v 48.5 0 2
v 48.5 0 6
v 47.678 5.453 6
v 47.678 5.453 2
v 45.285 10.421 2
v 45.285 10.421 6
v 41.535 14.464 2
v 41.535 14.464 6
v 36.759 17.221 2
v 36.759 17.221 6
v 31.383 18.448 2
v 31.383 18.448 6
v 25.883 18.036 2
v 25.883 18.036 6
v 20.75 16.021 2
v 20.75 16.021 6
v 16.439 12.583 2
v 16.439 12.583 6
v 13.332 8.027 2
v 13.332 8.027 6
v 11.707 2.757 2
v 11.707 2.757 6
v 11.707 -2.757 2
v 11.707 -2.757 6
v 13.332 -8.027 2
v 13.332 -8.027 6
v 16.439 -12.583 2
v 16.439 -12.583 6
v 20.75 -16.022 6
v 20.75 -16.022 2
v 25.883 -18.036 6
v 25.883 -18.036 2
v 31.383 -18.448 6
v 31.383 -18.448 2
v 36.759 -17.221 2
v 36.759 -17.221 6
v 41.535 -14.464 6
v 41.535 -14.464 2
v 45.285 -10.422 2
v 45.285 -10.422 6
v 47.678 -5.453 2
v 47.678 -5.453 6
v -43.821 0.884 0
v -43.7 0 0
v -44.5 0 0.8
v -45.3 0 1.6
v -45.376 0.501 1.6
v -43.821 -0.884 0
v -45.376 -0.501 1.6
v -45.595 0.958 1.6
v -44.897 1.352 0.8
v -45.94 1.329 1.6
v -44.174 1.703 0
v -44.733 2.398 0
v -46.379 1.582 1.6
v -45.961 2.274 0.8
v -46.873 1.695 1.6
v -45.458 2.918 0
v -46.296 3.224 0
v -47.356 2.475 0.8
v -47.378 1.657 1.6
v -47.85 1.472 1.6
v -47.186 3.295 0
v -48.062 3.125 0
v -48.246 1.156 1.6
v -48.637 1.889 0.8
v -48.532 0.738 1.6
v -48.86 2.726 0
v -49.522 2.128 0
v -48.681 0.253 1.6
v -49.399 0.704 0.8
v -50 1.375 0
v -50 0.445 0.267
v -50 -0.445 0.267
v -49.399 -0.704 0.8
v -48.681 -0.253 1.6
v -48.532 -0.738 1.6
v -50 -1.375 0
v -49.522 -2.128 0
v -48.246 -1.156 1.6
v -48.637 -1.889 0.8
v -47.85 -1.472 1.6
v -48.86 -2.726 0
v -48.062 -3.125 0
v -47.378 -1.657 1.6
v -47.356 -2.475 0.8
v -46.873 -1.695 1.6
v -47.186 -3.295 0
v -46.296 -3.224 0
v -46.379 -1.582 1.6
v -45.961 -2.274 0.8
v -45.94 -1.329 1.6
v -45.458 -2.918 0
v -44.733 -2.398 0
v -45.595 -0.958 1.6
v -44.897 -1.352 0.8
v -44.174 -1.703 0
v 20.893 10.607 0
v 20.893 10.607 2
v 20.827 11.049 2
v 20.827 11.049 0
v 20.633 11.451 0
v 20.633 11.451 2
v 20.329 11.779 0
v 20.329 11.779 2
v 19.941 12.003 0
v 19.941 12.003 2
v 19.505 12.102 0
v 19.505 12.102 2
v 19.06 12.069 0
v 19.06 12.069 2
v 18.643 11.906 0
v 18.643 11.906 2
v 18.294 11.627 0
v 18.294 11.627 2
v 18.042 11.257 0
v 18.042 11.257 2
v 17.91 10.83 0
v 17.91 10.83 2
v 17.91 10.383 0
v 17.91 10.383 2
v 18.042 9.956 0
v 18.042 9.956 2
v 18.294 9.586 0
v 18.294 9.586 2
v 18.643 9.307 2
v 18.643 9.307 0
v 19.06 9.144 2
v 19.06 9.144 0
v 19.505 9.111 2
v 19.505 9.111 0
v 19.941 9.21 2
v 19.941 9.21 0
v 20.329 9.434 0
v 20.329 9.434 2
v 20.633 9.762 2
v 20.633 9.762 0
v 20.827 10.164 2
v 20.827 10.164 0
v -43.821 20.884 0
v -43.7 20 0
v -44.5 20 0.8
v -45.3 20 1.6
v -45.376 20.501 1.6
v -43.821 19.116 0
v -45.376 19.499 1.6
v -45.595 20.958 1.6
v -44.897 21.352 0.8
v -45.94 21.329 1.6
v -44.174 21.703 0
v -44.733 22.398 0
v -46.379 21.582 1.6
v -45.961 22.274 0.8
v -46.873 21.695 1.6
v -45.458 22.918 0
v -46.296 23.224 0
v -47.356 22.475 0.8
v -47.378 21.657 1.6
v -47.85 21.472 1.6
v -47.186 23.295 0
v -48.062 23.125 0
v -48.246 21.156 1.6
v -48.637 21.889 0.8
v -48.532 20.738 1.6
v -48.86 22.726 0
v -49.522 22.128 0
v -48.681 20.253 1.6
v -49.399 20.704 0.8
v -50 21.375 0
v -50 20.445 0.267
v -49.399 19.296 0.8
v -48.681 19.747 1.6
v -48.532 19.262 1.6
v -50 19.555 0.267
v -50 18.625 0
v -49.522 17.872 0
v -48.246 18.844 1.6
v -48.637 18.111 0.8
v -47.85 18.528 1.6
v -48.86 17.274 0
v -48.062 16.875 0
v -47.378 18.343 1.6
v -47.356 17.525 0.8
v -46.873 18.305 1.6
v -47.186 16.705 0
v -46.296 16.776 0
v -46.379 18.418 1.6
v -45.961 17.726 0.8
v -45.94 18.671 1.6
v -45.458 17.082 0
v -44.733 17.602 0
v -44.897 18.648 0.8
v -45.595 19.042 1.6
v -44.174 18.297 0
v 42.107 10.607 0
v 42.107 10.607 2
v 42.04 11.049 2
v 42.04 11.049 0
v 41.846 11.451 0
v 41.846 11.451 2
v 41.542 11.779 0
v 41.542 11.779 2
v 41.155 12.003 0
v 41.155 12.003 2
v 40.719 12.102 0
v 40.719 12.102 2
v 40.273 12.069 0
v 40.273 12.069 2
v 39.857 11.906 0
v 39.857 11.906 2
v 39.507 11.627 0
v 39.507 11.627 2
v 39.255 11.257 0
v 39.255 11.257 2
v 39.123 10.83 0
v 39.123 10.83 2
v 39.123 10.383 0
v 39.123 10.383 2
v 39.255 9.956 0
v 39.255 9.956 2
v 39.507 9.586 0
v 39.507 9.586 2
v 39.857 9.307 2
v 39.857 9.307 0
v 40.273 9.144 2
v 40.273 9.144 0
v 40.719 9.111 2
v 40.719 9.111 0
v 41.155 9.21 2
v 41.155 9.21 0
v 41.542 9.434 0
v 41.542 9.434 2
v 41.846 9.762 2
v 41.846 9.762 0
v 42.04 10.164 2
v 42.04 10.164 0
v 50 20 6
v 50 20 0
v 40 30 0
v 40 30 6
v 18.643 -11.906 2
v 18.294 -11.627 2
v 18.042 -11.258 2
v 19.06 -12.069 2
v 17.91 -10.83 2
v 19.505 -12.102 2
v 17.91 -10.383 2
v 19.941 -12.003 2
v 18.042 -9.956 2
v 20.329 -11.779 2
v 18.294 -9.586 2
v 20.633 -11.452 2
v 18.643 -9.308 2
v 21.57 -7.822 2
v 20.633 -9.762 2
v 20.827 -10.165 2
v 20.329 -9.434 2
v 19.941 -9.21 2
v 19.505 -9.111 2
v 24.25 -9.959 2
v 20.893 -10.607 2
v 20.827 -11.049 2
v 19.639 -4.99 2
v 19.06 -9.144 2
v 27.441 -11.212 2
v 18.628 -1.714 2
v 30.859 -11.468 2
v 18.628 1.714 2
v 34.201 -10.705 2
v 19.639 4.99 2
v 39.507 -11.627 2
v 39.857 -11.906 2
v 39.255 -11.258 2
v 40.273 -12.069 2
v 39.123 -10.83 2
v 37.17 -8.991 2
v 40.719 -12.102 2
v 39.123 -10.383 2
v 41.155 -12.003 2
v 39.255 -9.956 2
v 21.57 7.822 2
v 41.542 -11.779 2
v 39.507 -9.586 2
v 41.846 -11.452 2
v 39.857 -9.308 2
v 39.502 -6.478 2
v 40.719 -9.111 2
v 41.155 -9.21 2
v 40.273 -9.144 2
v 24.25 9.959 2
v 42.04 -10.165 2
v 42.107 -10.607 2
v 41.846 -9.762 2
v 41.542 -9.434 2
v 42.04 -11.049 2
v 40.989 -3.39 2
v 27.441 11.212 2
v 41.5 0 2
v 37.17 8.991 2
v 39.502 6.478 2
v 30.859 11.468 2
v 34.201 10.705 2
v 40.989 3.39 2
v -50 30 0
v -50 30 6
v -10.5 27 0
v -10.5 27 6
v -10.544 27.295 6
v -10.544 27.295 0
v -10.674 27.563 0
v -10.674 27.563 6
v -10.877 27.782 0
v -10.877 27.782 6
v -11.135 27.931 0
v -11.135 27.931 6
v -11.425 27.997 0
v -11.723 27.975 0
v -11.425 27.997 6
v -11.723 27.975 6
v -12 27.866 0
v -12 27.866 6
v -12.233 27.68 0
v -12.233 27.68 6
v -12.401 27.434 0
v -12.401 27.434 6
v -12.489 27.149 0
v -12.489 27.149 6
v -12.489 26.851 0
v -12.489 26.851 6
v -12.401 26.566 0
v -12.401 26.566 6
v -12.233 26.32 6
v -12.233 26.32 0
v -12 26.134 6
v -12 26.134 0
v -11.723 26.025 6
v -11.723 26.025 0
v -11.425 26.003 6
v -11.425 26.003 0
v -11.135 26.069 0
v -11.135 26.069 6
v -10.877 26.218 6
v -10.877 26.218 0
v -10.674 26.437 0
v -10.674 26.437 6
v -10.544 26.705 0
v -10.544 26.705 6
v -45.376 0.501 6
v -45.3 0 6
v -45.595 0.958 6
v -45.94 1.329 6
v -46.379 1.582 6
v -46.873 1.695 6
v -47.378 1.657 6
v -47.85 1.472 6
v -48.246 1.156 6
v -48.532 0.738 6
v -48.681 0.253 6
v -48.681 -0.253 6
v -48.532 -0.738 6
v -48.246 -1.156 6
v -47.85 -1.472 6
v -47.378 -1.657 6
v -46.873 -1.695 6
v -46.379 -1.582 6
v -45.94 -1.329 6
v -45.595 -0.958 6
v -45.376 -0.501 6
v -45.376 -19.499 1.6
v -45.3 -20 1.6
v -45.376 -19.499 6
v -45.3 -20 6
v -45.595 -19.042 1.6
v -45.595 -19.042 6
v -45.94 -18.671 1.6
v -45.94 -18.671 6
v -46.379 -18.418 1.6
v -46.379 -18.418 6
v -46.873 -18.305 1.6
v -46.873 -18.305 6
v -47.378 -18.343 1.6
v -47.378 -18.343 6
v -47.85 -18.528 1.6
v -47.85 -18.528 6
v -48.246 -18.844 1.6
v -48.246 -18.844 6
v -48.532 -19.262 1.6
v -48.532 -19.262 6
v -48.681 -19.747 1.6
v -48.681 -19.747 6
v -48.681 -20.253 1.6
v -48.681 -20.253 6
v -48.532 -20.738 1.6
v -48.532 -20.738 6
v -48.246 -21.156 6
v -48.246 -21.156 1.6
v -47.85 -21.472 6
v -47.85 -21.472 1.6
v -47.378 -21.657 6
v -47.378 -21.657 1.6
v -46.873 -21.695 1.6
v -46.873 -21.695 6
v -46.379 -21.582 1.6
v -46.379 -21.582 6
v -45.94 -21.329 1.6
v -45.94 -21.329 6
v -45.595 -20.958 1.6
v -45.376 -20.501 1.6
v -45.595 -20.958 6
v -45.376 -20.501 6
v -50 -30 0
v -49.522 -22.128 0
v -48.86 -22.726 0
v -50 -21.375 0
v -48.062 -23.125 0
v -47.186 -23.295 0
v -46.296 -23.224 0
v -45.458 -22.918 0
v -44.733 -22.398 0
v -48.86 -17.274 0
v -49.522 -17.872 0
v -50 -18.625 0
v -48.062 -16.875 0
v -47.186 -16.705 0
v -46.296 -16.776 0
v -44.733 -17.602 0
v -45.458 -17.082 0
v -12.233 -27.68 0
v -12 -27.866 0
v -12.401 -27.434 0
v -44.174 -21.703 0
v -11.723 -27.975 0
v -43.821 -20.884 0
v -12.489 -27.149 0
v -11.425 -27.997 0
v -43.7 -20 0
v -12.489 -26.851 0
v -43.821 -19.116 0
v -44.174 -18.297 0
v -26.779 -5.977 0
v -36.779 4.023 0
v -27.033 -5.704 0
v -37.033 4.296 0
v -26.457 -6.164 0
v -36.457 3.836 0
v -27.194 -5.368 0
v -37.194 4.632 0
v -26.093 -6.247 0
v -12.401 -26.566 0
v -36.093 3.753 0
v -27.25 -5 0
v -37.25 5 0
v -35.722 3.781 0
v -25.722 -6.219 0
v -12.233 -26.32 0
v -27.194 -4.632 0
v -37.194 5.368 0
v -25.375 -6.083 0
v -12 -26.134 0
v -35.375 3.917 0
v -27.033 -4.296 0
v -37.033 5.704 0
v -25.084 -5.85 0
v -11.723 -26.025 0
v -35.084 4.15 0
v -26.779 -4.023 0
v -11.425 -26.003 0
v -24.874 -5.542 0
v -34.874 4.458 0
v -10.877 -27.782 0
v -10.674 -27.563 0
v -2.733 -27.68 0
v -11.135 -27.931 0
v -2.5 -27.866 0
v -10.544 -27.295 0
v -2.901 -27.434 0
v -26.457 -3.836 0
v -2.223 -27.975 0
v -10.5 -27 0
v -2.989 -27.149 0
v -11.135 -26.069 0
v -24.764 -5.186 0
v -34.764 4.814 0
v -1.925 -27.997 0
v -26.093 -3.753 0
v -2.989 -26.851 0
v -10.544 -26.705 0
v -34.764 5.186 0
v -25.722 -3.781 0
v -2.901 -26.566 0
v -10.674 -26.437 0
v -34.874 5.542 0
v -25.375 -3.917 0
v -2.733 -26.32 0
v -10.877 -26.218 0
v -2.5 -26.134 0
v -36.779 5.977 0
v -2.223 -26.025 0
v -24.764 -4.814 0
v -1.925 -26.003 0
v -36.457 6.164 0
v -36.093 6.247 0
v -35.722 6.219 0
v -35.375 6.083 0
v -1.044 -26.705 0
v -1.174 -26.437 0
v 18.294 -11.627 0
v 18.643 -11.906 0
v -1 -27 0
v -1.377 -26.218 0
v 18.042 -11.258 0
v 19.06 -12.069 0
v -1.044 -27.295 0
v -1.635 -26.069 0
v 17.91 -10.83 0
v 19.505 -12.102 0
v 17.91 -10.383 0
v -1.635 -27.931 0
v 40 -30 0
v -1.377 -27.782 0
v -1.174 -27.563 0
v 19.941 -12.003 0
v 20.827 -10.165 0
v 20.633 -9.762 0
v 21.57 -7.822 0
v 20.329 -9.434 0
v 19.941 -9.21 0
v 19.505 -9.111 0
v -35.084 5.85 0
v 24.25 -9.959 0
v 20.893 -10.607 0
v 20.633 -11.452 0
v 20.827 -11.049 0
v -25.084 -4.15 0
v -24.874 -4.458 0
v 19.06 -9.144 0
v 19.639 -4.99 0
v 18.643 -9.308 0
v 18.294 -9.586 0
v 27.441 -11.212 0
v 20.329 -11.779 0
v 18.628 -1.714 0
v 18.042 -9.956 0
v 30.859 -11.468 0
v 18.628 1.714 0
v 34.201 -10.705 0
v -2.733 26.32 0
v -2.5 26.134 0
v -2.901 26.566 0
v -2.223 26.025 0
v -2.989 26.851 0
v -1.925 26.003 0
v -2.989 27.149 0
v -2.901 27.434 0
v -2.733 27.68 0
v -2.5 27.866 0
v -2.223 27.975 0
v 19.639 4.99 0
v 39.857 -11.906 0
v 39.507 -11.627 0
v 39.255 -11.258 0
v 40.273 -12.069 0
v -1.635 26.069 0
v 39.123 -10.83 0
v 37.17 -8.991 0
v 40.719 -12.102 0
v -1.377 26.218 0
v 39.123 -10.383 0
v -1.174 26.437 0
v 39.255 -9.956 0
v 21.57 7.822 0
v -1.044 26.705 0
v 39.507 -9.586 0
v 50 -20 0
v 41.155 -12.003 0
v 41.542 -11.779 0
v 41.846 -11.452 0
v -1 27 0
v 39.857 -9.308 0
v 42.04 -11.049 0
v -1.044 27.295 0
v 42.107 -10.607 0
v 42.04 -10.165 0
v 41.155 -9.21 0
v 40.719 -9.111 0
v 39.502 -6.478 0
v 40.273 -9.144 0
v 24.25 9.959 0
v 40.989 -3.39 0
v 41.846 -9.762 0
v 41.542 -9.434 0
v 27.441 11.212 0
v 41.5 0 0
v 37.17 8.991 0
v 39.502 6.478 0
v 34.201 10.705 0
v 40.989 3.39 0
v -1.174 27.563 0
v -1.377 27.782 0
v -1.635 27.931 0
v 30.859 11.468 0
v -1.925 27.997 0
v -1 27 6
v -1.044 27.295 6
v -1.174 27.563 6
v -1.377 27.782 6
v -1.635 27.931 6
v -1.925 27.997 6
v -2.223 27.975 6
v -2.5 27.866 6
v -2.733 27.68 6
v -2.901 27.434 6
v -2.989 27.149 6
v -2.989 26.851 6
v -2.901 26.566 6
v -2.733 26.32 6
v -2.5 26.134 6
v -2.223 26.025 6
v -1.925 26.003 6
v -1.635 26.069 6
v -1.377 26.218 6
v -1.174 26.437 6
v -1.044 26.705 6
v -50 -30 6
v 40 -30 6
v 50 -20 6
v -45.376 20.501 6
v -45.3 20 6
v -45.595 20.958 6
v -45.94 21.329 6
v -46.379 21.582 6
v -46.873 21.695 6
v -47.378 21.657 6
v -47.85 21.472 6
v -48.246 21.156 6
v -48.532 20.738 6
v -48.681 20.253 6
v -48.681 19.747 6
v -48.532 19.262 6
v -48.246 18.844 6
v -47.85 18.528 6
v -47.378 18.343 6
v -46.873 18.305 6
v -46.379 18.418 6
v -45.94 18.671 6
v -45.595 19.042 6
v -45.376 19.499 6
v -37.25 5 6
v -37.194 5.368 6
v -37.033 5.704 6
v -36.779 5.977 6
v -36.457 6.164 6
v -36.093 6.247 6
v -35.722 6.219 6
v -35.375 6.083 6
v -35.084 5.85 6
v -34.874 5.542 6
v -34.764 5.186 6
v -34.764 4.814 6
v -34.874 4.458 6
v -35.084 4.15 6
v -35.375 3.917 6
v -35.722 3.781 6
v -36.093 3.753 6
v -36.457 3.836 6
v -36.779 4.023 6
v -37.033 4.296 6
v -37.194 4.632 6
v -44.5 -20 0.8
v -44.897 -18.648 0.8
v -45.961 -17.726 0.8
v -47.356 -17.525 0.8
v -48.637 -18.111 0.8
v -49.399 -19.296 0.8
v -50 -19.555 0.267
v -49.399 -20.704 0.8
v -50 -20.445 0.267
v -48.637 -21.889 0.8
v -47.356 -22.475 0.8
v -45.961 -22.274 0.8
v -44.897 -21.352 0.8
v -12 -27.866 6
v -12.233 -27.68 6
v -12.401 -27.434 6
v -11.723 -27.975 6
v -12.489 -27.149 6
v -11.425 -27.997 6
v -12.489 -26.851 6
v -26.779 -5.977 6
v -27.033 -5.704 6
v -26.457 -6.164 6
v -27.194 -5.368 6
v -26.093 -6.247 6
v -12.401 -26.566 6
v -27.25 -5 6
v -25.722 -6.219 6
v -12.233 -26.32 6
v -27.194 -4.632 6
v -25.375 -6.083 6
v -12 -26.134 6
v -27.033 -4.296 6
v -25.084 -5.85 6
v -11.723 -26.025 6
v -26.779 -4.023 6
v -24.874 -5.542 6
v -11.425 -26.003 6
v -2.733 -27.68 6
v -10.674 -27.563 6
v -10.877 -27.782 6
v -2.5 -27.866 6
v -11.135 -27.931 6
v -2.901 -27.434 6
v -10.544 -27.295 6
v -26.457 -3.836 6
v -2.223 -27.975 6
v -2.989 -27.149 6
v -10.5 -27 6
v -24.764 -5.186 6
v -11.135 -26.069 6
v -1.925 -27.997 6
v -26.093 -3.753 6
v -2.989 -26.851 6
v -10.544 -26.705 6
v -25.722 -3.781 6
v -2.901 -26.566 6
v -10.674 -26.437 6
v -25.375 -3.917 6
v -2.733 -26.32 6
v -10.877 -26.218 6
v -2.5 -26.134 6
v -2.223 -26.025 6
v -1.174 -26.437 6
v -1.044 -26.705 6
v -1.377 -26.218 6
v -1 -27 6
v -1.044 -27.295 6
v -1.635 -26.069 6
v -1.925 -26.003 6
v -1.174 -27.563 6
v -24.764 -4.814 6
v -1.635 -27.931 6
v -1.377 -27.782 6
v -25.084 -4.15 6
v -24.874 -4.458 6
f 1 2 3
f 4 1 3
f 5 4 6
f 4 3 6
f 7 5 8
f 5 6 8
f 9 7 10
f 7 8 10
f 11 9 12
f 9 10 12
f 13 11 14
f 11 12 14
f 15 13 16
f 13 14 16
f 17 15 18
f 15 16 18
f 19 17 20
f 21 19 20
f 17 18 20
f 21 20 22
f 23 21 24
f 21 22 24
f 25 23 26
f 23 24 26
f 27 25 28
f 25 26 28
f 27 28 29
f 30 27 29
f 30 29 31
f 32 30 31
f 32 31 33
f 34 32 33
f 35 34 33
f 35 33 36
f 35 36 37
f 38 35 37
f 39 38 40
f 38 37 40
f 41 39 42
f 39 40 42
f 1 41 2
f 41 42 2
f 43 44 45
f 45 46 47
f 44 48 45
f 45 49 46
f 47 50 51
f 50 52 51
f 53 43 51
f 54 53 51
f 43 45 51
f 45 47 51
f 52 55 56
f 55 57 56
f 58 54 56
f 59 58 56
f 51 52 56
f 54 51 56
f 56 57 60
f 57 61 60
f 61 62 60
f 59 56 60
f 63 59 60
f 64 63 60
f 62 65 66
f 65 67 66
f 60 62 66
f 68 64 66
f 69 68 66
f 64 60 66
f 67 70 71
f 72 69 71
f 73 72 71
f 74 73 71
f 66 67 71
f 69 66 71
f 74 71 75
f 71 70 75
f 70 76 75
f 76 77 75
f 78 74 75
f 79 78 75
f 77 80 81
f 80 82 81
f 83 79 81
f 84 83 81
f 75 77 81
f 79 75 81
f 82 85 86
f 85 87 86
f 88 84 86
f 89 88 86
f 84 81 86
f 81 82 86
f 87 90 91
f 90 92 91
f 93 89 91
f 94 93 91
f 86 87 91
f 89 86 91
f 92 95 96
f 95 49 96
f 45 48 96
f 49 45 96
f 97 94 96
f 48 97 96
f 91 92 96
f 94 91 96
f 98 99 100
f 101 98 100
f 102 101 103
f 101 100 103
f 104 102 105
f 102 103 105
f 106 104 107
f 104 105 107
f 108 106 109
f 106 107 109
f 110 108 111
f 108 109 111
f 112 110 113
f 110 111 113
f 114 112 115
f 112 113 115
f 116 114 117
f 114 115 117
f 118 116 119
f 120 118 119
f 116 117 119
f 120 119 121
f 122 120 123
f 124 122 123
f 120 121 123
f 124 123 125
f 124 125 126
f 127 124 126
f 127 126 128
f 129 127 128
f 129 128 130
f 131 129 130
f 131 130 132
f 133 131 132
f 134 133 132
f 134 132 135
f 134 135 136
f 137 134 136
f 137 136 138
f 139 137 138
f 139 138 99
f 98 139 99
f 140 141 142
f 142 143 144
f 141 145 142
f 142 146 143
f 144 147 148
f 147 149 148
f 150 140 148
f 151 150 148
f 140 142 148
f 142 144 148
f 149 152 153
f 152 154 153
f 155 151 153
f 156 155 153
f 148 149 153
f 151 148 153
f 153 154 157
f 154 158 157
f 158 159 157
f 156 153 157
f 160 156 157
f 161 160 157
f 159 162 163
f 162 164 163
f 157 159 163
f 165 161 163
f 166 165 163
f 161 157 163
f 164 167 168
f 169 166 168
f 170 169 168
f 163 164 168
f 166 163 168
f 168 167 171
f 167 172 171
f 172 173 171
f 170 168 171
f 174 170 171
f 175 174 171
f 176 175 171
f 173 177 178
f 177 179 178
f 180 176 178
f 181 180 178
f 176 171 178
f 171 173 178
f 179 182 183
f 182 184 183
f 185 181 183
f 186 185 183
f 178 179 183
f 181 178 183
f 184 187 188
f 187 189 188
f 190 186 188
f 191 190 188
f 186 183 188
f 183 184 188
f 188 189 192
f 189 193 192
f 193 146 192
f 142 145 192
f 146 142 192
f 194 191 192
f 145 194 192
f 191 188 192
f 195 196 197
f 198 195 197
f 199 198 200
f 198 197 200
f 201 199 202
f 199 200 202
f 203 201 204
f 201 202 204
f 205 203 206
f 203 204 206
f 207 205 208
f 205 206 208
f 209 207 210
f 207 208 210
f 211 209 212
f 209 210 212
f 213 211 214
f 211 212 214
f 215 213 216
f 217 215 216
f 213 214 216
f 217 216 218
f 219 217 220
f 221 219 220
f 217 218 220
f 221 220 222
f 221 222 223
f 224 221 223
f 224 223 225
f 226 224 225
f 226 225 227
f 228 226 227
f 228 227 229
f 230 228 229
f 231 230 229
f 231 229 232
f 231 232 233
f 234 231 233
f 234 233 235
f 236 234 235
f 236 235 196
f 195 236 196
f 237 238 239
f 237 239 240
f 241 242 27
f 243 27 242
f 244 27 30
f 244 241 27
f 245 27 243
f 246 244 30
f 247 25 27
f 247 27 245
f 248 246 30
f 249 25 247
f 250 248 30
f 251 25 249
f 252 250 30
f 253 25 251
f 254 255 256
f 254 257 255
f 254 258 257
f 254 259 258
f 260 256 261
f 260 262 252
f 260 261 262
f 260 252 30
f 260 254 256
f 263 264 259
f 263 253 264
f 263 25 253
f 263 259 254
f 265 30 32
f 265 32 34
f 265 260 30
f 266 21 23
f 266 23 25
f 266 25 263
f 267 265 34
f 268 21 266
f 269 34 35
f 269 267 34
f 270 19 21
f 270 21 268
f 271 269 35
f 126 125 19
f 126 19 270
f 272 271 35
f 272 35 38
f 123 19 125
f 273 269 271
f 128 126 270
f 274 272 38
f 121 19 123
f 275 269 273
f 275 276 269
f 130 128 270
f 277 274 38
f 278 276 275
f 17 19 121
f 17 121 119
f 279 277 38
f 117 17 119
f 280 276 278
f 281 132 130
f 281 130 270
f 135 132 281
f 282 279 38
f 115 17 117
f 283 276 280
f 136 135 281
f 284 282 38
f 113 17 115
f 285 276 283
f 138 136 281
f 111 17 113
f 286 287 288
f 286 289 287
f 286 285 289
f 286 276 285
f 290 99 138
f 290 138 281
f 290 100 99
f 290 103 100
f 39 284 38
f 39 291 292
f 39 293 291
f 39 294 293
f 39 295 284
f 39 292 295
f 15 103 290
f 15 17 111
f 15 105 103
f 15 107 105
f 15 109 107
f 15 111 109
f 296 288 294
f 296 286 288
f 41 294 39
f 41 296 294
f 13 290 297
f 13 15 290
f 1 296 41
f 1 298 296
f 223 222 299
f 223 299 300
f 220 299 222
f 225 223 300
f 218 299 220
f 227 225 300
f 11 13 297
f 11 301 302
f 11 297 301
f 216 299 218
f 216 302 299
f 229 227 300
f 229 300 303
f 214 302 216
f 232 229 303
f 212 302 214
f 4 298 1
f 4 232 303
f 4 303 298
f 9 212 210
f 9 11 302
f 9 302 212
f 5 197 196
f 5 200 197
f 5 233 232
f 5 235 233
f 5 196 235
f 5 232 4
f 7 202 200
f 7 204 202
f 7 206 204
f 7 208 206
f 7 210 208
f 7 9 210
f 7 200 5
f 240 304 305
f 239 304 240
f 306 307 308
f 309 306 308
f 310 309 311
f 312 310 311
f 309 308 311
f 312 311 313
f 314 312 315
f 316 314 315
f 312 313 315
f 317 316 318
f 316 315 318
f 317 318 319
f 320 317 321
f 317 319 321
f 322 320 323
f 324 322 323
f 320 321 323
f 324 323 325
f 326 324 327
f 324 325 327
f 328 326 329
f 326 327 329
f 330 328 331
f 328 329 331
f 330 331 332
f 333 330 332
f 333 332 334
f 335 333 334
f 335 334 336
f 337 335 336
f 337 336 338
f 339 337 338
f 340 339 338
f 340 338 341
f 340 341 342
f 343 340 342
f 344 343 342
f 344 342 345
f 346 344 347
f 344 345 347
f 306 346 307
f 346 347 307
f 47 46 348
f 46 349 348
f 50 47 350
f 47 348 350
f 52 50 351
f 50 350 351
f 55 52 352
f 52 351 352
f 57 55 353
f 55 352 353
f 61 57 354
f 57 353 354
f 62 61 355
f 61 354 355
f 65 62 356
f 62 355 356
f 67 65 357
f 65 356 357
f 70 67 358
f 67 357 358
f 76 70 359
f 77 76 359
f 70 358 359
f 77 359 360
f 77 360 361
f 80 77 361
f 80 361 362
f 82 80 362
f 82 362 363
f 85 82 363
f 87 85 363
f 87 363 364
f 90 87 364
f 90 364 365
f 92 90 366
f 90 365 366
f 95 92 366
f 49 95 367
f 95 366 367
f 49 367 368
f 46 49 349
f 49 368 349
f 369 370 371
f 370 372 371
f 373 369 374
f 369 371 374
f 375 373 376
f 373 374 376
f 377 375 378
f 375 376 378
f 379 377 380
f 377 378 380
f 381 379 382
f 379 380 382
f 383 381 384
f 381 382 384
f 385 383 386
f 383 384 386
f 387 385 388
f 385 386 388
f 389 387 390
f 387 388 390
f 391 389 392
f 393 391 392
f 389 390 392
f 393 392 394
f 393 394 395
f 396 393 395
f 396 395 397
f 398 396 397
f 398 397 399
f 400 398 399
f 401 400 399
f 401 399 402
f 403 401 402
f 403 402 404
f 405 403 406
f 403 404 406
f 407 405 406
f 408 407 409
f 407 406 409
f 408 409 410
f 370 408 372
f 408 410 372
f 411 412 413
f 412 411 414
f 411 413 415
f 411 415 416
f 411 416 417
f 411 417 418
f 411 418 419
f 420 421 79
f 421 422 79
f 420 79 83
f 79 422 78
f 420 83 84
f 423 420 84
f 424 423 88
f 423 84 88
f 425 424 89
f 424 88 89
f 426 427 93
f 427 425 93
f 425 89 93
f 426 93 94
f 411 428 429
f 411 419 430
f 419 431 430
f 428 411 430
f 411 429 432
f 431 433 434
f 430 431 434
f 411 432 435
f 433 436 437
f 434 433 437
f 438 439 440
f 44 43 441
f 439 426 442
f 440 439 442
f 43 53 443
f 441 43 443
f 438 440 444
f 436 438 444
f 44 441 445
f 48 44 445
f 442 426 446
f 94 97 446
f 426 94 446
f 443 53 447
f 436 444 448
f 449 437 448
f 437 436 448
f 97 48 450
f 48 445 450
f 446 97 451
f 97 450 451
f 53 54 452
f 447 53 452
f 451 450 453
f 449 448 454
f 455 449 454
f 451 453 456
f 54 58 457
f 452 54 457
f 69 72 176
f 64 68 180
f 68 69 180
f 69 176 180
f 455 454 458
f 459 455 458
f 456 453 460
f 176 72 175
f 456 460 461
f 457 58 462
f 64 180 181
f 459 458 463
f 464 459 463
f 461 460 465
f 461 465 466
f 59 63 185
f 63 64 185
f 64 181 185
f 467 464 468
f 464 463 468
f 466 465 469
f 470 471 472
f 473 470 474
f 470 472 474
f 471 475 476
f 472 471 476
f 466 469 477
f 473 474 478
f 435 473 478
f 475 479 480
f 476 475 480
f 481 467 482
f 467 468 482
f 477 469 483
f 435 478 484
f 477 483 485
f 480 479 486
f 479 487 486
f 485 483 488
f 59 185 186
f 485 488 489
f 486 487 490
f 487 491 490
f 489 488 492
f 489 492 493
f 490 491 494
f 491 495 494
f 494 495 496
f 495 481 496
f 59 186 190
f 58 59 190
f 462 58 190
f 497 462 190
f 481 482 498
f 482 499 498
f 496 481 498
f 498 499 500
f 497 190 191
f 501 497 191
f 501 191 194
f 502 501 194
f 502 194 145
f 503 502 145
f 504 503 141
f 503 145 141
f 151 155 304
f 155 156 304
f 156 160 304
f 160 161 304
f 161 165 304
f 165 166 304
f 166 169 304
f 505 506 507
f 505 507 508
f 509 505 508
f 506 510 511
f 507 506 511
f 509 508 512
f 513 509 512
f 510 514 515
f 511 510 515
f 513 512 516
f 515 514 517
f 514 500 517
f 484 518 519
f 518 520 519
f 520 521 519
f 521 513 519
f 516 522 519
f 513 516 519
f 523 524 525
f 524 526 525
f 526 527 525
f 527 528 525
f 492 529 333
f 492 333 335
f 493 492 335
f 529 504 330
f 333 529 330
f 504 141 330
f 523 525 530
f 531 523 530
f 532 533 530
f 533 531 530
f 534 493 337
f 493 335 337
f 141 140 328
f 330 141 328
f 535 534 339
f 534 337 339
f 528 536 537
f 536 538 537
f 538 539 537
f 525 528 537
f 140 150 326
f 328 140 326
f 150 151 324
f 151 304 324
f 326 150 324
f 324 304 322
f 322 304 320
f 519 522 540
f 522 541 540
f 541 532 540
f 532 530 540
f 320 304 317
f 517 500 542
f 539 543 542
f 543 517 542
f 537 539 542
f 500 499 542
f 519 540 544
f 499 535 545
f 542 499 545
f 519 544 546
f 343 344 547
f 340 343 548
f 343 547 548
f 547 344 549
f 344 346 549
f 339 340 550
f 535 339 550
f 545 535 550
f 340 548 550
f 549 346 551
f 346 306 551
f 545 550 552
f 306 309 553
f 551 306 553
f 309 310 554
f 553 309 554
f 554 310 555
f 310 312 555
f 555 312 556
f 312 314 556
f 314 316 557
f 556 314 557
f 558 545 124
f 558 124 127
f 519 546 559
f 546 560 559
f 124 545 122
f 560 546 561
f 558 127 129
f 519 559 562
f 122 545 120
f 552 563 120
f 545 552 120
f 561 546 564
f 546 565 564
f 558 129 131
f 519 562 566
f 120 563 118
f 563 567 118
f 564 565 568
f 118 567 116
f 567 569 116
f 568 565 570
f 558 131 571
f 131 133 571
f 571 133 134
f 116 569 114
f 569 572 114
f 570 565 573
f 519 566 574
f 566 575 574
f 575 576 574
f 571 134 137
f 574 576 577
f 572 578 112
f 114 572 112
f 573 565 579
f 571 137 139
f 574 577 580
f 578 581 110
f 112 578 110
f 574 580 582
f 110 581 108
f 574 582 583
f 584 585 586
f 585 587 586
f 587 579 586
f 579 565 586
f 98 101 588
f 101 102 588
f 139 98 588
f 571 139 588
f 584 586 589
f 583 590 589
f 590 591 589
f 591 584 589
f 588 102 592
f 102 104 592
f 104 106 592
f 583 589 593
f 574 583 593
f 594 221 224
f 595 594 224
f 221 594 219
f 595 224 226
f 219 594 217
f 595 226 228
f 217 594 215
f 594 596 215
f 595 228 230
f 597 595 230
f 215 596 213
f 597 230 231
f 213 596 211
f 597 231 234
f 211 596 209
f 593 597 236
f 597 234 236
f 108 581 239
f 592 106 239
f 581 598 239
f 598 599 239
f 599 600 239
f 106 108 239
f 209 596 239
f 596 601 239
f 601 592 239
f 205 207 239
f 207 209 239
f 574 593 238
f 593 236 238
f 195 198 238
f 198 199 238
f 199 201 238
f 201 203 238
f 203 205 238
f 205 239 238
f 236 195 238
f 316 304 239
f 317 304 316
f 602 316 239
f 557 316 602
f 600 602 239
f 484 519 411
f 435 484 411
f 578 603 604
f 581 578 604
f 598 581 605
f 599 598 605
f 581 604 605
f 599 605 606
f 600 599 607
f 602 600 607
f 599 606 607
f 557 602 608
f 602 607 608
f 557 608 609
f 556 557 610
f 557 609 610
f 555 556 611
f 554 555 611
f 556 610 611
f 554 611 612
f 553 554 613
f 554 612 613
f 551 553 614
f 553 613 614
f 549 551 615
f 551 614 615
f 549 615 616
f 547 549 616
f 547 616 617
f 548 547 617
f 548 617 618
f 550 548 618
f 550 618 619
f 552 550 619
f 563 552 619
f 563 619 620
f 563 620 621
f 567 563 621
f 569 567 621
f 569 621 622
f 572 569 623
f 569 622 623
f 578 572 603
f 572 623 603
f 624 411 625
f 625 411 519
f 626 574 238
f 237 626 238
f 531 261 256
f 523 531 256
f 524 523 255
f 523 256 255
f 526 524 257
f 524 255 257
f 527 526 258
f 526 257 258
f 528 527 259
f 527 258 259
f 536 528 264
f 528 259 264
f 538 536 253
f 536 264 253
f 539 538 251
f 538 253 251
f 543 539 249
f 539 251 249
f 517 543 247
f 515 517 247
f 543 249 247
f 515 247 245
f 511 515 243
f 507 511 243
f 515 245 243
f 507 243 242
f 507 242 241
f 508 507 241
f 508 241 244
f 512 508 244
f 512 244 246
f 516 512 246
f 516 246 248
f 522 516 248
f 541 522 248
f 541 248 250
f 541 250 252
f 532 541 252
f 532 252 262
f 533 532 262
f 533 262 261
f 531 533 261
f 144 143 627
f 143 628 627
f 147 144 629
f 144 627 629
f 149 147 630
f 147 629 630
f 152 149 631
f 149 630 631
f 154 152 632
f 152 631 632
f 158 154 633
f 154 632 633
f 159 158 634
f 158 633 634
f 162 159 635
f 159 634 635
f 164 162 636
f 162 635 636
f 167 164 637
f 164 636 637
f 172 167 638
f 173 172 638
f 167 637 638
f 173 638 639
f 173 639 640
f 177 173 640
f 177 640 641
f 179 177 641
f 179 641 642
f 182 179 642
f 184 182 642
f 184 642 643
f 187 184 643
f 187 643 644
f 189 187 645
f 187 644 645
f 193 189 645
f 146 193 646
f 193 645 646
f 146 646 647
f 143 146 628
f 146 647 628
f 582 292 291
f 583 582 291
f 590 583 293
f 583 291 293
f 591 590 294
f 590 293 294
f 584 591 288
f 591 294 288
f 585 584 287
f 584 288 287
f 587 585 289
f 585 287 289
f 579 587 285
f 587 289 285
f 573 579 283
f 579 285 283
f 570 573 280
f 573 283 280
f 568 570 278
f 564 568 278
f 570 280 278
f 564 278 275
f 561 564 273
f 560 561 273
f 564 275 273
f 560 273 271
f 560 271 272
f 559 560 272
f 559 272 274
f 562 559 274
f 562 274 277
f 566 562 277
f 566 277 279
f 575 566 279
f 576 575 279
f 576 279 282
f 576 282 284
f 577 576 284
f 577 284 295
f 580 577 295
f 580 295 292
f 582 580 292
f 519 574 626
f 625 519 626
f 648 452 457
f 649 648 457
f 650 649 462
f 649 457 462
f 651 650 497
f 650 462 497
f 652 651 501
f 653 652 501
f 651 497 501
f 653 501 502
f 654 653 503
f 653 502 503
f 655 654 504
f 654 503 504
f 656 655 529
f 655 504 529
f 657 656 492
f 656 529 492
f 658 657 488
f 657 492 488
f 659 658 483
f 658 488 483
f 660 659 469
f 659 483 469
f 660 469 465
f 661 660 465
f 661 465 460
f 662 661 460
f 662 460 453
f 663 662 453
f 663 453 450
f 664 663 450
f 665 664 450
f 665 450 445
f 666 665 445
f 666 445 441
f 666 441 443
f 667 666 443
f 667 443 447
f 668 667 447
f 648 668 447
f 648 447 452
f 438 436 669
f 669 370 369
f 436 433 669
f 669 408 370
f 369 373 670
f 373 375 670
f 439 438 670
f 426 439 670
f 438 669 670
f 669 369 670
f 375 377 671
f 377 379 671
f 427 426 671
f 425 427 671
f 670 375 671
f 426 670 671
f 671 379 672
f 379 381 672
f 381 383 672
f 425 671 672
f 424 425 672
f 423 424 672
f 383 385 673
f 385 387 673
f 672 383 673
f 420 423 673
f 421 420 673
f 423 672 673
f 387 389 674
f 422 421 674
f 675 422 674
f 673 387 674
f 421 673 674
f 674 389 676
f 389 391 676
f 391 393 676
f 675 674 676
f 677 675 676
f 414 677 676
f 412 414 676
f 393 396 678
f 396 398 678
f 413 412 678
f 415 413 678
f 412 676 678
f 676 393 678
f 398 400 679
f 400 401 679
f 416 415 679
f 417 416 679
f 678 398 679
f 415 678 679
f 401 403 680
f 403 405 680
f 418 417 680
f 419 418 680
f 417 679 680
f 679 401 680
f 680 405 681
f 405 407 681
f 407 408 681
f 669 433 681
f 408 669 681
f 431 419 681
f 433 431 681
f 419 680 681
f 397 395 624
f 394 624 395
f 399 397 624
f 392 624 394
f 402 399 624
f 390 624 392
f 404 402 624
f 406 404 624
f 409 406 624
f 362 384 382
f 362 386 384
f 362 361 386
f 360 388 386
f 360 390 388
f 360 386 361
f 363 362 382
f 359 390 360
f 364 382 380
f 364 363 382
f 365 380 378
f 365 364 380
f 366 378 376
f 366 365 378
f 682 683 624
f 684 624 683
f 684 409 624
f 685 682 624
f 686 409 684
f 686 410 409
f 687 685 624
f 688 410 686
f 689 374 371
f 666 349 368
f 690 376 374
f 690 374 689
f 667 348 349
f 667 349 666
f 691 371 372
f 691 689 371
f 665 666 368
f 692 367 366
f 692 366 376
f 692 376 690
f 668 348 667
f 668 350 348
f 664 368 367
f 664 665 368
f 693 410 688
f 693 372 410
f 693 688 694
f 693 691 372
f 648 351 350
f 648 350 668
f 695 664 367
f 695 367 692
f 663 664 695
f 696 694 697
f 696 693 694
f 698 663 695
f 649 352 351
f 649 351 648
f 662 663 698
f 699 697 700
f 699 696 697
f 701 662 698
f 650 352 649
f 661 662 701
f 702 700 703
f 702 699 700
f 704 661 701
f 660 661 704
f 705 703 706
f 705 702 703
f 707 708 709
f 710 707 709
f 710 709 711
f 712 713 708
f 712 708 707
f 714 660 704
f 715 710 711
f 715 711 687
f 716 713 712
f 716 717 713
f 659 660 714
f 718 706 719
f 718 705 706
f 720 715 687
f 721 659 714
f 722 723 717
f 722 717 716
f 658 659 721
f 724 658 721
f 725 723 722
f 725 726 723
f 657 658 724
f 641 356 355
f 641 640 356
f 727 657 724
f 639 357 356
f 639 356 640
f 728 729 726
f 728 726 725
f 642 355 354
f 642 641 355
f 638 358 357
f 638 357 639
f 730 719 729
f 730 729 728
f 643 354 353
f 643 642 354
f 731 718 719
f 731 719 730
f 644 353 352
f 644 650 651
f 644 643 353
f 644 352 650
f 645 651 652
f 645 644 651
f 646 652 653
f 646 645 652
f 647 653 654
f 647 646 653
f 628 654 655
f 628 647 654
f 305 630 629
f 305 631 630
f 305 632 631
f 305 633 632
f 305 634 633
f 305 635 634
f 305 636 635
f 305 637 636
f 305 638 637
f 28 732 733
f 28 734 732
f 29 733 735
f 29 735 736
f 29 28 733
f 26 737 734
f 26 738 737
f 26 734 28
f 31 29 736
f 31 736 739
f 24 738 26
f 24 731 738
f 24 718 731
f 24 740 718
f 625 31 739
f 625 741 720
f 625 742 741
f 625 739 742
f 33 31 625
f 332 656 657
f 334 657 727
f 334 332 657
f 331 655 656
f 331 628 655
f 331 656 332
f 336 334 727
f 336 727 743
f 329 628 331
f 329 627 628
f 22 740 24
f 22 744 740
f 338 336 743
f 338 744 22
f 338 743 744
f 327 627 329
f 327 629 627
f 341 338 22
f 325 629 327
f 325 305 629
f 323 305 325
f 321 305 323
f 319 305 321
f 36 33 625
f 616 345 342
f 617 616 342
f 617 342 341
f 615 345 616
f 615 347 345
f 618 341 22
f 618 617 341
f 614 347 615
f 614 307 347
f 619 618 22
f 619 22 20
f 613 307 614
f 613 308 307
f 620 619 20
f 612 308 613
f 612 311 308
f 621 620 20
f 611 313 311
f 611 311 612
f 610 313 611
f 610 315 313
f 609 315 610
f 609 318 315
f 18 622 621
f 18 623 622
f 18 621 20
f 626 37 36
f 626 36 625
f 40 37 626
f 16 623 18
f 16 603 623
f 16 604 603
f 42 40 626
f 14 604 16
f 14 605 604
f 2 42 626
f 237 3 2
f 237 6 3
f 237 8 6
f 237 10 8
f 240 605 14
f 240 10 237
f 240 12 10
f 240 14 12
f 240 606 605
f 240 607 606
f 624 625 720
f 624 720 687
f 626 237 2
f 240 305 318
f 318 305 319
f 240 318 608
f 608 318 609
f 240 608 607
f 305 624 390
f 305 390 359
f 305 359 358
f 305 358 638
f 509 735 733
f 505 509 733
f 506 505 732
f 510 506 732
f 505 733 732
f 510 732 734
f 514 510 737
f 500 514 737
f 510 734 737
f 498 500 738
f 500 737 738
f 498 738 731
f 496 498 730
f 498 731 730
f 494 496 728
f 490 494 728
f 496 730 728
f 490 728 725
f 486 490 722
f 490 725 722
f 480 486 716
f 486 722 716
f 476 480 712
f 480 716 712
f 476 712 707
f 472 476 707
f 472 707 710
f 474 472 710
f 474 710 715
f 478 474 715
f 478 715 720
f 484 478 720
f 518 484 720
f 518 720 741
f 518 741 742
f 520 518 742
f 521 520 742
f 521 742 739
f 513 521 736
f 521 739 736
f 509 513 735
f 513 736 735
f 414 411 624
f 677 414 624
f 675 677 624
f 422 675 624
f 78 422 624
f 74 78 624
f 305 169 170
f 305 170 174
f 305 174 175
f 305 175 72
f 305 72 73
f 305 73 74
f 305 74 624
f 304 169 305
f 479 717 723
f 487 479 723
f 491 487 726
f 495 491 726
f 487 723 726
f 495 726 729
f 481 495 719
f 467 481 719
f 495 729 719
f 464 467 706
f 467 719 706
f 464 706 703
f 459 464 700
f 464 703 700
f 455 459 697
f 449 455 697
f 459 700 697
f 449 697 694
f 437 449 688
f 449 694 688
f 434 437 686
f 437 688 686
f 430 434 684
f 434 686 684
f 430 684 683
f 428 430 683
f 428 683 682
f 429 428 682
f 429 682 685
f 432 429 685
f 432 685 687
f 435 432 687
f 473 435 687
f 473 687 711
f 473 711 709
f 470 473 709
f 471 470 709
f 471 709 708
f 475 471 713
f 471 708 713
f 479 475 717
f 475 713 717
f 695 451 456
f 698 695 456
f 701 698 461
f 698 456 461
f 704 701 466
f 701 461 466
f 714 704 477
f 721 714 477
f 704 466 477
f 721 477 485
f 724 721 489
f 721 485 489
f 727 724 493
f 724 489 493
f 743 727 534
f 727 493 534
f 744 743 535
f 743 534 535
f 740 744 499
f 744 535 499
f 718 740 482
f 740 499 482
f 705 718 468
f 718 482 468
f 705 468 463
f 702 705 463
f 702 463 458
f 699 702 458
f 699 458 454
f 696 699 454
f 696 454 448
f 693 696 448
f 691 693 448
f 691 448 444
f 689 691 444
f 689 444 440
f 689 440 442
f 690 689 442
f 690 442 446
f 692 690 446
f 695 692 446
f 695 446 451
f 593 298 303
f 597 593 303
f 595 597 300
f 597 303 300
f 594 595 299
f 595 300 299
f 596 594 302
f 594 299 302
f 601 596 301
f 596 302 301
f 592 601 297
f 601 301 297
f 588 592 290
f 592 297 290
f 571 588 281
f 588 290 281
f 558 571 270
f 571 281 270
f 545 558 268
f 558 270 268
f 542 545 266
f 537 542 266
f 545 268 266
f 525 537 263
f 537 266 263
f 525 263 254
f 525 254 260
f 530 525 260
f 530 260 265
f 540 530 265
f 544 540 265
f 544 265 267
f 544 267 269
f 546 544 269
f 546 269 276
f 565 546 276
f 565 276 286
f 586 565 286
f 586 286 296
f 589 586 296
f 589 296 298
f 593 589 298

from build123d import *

# Parameters (mm, degrees)
SKETCH_1_W                = 100
SKETCH_1_H                = 60
EXTRUDE_1_DEPTH           = 6
SKETCH_2_R                = 11.5
SKETCH_2_R_2              = 1.5
CUT_EXTRUDE_1_DEPTH       = 10
SKETCH_3_R                = 18.5
CUT_EXTRUDE_2_DEPTH       = 4
HOLE_WIZARD_2_D           = 3.4
HOLE_WIZARD_2_CSINK_D     = 6.6
HOLE_WIZARD_2_CSINK_ANGLE = 90
CHAMFER_1_SIZE            = 10
HOLE_WIZARD_M3_1_D        = 2.5
HOLE_WIZARD_M3_1_DEPTH    = 7.5
HOLE_WIZARD_M3_1_TIP      = 0.751075774
SKETCH_16_R               = 1
CUT_EXTRUDE_3_DEPTH       = 6


with BuildPart() as part:
    # 草图1 → 凸台-拉伸1 (new body)
    with BuildSketch(Plane.XY):
        Rectangle(SKETCH_1_W, SKETCH_1_H)
    extrude(amount=EXTRUDE_1_DEPTH)

    # 草图2 → 切除-拉伸1 (cut)
    with BuildSketch(Plane.XY.offset(6)):
        with Locations((30, -8.8724e-05)):
            Circle(SKETCH_2_R)
        with Locations((40.606601718, 10.606512994)):
            Circle(SKETCH_2_R_2)
        with Locations((40.606601718, -10.606690441)):
            Circle(SKETCH_2_R_2)
        with Locations((19.393398282, 10.606512994)):
            Circle(SKETCH_2_R_2)
        with Locations((19.393398282, -10.606690441)):
            Circle(SKETCH_2_R_2)
    extrude(amount=-CUT_EXTRUDE_1_DEPTH, mode=Mode.SUBTRACT)

    # 草图3 → 切除-拉伸2 (cut)
    with BuildSketch(Plane.XY.offset(6)):
        with Locations((30, -8.8724e-05)):
            Circle(SKETCH_3_R)
    extrude(amount=-CUT_EXTRUDE_2_DEPTH, mode=Mode.SUBTRACT)

    # 打孔尺寸(%根据十字)槽半沉头木螺钉的类型2 (through all)
    with Locations(Plane(origin=(0, 0, 0), x_dir=(-1, 0, 0), z_dir=(0, 0, -1))):
        with Locations((47, -20), (47, 0), (47, 20)):
            CounterSinkHole(HOLE_WIZARD_2_D / 2, HOLE_WIZARD_2_CSINK_D / 2, counter_sink_angle=HOLE_WIZARD_2_CSINK_ANGLE)

    # 倒角1
    chamfer_1_edges = [part.edges().sort_by_distance(p)[0] for p in [
        (50, 30, 3),
        (50, -30, 3),
    ]]
    chamfer(chamfer_1_edges, length=CHAMFER_1_SIZE)

    # M3 螺纹孔1
    with Locations(Plane.XY.offset(6)):
        with Locations((-36, 5), (-26, -5)):
            Hole(HOLE_WIZARD_M3_1_D / 2, depth=HOLE_WIZARD_M3_1_DEPTH)
            with Locations((0, 0, -(HOLE_WIZARD_M3_1_DEPTH + HOLE_WIZARD_M3_1_TIP / 2))):  # 118° drill point
                Cone(0, HOLE_WIZARD_M3_1_D / 2, HOLE_WIZARD_M3_1_TIP, mode=Mode.SUBTRACT)

    # 草图16 → 切除-拉伸3 (cut)
    with BuildSketch(Plane.XY.offset(6)):
        with Locations((-2, 27)):
            Circle(SKETCH_16_R)
        with Locations((-11.5, 27)):
            Circle(SKETCH_16_R)
        with Locations((-11.5, -27)):
            Circle(SKETCH_16_R)
        with Locations((-2, -27)):
            Circle(SKETCH_16_R)
    extrude(amount=-CUT_EXTRUDE_3_DEPTH, mode=Mode.SUBTRACT)


solid = part.part
